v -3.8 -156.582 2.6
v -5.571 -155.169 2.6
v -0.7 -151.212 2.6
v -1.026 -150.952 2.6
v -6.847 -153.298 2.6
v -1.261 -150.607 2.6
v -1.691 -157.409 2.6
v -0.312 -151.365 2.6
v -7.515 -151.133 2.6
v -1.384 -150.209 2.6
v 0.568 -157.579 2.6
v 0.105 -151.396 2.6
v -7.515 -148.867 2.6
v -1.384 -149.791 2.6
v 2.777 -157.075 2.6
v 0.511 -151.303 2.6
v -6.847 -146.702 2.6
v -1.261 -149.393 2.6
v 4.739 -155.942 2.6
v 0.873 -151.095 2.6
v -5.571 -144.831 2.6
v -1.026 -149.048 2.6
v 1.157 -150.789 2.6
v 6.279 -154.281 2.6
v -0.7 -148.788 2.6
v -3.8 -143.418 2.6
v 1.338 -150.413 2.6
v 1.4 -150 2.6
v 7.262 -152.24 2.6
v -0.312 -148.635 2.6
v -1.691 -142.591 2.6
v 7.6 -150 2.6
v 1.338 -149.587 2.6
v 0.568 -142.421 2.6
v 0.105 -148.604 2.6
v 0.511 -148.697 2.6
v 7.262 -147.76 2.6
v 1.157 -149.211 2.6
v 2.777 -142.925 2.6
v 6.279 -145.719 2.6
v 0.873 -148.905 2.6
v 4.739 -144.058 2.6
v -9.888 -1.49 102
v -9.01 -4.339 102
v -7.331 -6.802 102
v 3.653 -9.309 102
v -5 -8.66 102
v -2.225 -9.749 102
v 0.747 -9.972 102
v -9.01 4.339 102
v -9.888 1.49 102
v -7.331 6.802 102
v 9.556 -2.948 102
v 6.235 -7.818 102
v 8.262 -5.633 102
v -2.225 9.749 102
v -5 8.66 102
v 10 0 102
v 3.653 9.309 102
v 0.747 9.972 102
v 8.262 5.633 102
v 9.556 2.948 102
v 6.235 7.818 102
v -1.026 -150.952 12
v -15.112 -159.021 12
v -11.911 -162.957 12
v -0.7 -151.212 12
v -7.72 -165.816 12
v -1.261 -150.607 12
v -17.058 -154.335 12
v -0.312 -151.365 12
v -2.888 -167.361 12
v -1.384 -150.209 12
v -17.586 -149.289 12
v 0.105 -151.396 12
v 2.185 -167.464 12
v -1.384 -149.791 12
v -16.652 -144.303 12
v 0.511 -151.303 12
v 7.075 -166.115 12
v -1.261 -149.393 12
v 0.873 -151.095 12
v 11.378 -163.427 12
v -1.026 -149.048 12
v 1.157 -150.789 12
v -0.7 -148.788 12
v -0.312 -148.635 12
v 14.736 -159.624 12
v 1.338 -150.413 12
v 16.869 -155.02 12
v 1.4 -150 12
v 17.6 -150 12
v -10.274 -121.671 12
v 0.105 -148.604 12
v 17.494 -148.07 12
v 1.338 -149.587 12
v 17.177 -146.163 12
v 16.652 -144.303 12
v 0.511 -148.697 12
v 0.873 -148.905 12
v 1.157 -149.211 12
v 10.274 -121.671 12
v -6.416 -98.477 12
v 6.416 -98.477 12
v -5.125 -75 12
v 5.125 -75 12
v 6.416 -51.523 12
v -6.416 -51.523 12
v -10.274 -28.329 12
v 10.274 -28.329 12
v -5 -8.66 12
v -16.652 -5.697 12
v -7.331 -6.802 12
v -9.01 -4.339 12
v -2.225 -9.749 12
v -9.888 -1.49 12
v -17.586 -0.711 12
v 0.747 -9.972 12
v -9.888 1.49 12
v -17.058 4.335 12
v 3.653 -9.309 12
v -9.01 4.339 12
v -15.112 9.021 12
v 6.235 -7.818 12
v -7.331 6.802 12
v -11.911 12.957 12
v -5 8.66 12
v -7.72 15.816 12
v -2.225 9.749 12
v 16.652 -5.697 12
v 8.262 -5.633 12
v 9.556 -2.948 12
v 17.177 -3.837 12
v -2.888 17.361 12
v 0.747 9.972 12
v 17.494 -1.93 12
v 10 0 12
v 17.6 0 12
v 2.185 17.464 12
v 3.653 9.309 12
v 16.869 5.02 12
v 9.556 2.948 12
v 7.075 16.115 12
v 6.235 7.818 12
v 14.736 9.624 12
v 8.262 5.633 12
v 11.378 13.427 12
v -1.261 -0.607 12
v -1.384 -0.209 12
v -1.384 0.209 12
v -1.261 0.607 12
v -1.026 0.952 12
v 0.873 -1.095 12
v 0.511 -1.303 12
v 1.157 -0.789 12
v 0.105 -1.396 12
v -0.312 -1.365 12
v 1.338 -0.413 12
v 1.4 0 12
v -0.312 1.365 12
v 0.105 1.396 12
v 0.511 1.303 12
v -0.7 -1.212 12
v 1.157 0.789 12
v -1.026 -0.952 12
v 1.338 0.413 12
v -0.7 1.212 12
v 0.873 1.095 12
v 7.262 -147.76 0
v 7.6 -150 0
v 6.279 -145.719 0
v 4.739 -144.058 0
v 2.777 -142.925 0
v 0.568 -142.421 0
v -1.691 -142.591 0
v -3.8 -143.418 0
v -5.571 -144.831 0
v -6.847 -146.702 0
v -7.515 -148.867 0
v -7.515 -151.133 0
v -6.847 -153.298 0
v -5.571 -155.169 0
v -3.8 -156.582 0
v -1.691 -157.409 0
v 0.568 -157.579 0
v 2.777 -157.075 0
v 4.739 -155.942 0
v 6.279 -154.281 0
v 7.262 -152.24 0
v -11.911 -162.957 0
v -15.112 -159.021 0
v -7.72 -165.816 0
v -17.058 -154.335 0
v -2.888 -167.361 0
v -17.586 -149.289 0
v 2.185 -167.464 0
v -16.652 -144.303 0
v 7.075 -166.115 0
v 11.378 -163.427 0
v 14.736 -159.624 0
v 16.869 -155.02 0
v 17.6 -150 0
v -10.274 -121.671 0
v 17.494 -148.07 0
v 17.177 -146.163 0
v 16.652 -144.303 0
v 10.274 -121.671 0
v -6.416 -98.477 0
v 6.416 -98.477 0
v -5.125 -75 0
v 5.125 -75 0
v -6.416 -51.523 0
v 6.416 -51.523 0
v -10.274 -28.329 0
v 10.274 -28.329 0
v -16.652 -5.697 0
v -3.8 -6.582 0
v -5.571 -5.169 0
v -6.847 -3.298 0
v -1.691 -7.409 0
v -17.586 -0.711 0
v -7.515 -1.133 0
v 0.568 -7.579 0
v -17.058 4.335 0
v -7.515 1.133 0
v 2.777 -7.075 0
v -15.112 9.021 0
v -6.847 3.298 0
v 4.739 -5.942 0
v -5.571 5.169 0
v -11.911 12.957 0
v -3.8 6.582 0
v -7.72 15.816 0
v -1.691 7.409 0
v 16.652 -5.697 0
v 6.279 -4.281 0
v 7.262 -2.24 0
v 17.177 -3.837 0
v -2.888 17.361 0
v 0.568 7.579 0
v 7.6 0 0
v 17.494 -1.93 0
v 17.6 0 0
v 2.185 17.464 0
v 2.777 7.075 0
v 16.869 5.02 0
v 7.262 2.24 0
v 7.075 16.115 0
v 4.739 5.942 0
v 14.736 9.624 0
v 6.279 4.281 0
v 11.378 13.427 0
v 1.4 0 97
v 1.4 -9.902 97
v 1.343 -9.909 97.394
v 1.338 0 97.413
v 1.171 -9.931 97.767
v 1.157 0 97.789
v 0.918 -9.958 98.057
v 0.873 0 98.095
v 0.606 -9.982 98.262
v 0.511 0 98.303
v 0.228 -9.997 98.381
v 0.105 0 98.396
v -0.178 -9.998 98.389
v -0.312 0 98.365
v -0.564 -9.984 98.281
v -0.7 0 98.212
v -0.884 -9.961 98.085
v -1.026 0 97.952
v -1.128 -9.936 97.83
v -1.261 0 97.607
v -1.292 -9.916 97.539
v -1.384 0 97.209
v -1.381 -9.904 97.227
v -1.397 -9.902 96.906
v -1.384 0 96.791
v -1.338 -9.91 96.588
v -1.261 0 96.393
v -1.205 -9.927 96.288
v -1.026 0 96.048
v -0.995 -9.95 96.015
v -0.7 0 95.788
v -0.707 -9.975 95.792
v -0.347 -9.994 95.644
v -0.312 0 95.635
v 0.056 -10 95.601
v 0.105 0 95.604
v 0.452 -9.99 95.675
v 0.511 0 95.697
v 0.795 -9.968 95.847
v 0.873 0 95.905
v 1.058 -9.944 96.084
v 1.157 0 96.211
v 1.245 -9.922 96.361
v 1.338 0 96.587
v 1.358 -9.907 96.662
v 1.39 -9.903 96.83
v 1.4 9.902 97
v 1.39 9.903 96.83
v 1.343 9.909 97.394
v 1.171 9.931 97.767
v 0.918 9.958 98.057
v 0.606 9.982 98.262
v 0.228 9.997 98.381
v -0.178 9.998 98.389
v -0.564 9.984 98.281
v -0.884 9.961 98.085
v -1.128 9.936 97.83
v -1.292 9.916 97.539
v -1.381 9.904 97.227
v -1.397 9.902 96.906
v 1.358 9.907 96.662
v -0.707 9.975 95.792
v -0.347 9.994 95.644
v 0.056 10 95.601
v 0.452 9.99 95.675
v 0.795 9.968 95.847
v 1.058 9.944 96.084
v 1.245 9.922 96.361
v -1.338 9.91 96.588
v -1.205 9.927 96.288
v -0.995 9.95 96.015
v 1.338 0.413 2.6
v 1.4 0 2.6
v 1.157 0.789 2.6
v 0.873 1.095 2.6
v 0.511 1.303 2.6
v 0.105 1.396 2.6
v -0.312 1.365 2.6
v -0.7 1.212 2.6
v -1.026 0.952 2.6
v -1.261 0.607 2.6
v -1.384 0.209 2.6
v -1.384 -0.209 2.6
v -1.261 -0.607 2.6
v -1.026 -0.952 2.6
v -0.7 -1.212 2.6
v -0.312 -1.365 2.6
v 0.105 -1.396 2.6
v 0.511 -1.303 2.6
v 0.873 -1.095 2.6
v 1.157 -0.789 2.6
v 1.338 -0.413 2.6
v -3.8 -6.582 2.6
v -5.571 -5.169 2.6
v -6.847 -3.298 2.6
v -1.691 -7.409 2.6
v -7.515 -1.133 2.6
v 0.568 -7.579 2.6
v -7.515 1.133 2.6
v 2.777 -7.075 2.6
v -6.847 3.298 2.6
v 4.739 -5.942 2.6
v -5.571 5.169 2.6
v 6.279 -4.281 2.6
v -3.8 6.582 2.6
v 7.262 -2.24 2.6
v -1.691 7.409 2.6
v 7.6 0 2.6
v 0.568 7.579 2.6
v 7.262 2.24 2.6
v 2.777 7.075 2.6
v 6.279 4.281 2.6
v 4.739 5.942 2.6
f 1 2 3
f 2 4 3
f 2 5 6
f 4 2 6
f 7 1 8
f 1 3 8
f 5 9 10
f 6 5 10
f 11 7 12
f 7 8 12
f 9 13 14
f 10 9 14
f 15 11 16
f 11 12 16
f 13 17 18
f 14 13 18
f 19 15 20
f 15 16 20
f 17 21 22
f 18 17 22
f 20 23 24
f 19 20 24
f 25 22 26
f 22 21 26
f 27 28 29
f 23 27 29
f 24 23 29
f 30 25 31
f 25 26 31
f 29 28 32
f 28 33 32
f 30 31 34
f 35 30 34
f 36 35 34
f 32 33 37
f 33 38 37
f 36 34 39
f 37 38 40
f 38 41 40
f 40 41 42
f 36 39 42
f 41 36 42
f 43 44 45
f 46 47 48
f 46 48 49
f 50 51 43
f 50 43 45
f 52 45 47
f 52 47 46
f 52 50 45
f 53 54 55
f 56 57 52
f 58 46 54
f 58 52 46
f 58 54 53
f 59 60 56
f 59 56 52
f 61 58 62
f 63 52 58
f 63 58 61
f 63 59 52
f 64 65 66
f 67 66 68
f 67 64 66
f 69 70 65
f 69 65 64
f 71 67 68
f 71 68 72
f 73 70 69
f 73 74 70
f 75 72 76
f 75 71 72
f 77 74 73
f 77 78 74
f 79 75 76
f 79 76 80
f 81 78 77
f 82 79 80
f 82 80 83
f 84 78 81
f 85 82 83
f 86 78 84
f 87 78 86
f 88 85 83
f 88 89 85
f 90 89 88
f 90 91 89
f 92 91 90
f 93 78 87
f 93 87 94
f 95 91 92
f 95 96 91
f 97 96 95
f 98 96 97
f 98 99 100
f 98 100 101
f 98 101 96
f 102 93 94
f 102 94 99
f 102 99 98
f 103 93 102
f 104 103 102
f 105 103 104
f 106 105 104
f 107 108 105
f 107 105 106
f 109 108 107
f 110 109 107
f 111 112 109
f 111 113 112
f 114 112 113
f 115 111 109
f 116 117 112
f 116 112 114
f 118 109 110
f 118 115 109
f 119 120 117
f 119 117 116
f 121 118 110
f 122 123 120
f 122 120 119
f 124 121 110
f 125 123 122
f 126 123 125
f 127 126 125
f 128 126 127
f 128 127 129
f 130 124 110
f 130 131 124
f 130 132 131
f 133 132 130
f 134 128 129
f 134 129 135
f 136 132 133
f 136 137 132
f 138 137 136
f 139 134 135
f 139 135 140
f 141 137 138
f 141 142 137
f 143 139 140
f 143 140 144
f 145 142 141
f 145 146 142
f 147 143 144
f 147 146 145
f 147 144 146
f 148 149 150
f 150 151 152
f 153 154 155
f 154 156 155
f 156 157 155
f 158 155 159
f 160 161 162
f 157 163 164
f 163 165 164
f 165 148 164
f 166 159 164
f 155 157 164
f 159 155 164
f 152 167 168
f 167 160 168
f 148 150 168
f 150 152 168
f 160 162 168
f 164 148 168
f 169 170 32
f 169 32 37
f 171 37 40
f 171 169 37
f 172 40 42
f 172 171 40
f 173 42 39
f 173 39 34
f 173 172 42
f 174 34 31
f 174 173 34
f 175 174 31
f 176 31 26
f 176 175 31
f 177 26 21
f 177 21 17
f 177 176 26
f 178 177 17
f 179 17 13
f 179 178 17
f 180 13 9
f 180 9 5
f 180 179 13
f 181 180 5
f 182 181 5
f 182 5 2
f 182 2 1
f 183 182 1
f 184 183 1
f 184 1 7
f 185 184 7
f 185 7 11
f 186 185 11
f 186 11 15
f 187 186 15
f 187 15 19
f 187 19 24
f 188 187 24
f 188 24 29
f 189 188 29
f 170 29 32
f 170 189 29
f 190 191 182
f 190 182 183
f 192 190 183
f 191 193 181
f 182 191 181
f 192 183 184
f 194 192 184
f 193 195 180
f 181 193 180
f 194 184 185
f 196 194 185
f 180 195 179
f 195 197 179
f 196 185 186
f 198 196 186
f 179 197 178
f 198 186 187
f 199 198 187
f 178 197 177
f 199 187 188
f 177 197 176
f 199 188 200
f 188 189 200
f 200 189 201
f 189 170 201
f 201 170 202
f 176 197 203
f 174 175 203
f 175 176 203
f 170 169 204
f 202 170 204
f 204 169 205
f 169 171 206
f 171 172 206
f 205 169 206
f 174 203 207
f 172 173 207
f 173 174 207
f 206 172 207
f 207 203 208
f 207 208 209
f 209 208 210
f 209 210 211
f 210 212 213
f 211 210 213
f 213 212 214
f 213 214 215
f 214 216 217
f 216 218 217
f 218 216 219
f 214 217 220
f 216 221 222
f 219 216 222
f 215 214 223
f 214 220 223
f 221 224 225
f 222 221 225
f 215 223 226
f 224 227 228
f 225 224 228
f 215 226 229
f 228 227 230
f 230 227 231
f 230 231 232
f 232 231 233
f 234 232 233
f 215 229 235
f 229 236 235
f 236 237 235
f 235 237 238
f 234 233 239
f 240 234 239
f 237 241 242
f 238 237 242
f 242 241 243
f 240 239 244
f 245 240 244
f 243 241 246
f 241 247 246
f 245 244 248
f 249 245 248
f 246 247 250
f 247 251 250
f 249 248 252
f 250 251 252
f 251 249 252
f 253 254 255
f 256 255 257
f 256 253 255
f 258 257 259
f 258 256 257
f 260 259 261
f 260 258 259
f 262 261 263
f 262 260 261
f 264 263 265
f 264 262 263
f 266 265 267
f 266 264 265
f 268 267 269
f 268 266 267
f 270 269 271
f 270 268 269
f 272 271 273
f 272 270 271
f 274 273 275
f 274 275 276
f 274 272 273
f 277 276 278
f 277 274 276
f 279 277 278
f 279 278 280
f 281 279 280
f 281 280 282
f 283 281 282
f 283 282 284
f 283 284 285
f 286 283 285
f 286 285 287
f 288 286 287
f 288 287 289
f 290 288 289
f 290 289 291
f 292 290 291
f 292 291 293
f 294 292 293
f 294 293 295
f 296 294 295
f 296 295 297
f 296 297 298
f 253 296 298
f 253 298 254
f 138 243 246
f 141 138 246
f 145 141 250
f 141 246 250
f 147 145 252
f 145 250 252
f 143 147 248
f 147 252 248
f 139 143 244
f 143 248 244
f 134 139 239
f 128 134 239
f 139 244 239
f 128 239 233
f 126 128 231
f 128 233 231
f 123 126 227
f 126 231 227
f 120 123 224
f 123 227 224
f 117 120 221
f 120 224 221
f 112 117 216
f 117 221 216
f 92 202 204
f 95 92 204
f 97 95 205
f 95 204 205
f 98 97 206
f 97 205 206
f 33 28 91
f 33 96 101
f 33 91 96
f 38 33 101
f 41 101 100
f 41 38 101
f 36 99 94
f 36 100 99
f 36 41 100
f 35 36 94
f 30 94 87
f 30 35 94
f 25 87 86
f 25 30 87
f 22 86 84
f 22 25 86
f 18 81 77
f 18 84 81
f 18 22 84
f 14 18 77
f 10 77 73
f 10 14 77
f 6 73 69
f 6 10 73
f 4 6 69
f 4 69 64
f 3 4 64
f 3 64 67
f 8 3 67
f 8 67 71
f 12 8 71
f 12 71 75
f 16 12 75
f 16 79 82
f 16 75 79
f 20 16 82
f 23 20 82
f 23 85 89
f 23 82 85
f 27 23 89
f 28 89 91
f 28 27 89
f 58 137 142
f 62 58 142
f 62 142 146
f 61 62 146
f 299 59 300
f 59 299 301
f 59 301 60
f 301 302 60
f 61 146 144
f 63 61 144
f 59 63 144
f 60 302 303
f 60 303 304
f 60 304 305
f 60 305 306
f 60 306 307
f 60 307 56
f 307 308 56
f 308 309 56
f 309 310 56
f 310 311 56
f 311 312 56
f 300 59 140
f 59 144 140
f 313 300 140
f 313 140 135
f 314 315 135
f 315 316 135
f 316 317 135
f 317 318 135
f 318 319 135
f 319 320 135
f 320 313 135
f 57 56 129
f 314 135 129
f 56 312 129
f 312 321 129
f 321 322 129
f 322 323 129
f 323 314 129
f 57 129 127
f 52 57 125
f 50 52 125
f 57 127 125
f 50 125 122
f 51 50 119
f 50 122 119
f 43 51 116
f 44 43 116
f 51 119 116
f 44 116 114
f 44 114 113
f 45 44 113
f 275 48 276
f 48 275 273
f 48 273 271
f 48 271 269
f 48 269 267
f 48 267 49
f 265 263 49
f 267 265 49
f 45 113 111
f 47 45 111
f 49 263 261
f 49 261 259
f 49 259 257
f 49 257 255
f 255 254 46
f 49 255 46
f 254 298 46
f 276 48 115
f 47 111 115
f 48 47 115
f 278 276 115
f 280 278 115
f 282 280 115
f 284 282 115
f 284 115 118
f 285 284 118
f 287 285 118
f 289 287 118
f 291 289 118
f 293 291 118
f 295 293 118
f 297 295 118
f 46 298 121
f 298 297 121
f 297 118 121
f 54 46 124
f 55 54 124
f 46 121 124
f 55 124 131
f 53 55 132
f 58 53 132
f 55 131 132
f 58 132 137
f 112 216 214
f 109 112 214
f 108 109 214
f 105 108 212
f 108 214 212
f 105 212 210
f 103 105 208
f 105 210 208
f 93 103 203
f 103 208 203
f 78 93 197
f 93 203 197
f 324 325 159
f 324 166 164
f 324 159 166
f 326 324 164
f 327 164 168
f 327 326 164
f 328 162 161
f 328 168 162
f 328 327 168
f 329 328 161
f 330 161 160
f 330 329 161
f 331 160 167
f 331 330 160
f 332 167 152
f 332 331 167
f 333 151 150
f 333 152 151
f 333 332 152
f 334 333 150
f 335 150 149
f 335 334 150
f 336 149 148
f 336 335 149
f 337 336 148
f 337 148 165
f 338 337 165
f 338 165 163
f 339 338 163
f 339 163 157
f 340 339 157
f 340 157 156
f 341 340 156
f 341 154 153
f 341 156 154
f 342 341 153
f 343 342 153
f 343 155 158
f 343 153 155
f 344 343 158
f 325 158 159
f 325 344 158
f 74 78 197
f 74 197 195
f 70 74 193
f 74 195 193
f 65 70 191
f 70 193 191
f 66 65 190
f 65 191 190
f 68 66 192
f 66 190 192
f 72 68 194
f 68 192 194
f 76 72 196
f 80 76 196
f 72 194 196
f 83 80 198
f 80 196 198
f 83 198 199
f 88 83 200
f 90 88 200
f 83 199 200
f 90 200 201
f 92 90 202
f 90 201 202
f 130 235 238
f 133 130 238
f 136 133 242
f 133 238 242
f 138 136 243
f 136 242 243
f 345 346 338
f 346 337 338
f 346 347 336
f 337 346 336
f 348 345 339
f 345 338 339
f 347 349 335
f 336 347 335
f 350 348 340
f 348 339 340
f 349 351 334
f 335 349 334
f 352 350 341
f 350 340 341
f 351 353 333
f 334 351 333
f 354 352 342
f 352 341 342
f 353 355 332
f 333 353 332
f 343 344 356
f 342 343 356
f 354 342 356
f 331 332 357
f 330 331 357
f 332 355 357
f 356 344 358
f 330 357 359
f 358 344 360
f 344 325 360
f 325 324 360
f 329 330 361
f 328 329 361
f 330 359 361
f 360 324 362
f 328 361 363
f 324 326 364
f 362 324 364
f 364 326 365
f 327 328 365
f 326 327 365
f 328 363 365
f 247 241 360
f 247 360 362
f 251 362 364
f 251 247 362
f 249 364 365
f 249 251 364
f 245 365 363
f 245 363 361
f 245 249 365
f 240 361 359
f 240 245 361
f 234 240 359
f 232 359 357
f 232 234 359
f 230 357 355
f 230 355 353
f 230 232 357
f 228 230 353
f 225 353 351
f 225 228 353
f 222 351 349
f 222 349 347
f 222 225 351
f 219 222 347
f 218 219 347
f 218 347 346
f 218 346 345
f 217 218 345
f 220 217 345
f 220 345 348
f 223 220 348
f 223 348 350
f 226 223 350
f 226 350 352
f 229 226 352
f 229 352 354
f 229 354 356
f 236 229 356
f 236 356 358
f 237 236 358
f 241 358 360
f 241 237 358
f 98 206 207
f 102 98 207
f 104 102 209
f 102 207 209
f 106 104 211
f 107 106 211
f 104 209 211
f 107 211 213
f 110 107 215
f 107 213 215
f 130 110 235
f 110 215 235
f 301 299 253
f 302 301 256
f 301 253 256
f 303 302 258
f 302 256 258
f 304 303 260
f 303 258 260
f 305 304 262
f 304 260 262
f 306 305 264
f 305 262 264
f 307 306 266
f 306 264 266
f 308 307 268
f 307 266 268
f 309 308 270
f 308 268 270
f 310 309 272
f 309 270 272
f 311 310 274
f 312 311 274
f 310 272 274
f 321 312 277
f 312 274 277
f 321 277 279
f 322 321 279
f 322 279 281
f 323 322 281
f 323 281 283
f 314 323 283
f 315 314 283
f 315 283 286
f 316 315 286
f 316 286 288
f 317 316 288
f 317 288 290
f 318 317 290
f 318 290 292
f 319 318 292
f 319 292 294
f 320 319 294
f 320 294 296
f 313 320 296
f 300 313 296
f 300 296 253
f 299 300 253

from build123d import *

# Parameters (mm, degrees)
F0_R          = 7.6
F1_DEPTH      = 12
F2_R          = 7.6
F3_DEPTH      = 2.6
F4_R          = 1.4
F5_DEPTH      = 12.001
F6_R          = 10
F7_DEPTH      = 90
F8_R          = 1.4
F9_DEPTH      = 17.601
F9_DEPTH_BACK = 167.601


with BuildPart() as f1:
    # F0 (on Top) → F1 (new body)
    with BuildSketch(Plane.XY):
        with BuildLine():
            ThreePointArc((16.6522889532, -5.697479497), (17.3614556644, -2.8878810938), (17.6, 0))
            ThreePointArc((17.6, 0), (-2.8878810938, 17.3614556644), (-16.6522889532, -5.697479497))
            ThreePointArc((-16.6522889532, -5.697479497), (0, -17.6), (16.6522889532, -5.697479497))
        make_face()
        Circle(F0_R, mode=Mode.SUBTRACT)
        with BuildLine():
            ThreePointArc((16.6522889532, -5.697479497), (0, -17.6), (-16.6522889532, -5.697479497))
            ThreePointArc((-16.6522889532, -5.697479497), (-5.1246012651, -75), (-16.6522889532, -144.302520503))
            ThreePointArc((-16.6522889532, -144.302520503), (0, -132.4), (16.6522889532, -144.302520503))
            ThreePointArc((16.6522889532, -144.302520503), (5.1246012651, -75), (16.6522889532, -5.697479497))
        make_face()
        with BuildLine():
            ThreePointArc((16.6522889532, -144.302520503), (0, -132.4), (-16.6522889532, -144.302520503))
            ThreePointArc((-16.6522889532, -144.302520503), (-2.8878810938, -167.3614556644), (17.6, -150))
            ThreePointArc((17.6, -150), (17.3614556644, -147.1121189062), (16.6522889532, -144.302520503))
        make_face()
        Circle(F0_R)
    extrude(amount=F1_DEPTH)

    # F2 (on Top) → F3 (cut)
    with BuildSketch(Plane.XY):
        Circle(F2_R)
        with Locations((0, -150)):
            Circle(F2_R)
    extrude(amount=F3_DEPTH, mode=Mode.SUBTRACT)

    # F4 (on Top) → F5 (cut, through all)
    with BuildSketch(Plane.XY):
        with Locations((0, -150)):
            Circle(F4_R)
        Circle(F4_R)
    extrude(amount=F5_DEPTH, mode=Mode.SUBTRACT)

    # F6 (on face) → F7 (join)
    with BuildSketch(Plane.XY.offset(12)):
        Circle(F6_R)
    extrude(amount=F7_DEPTH)

    # F8 (on Front) → F9 (cut, two sides)
    with BuildSketch(Plane.XZ) as f9_sk:
        with Locations((0, 97)):
            Circle(F8_R)
    extrude(amount=-F9_DEPTH, mode=Mode.SUBTRACT)
    extrude(f9_sk.sketch, amount=F9_DEPTH_BACK, mode=Mode.SUBTRACT)


solid = f1.part
